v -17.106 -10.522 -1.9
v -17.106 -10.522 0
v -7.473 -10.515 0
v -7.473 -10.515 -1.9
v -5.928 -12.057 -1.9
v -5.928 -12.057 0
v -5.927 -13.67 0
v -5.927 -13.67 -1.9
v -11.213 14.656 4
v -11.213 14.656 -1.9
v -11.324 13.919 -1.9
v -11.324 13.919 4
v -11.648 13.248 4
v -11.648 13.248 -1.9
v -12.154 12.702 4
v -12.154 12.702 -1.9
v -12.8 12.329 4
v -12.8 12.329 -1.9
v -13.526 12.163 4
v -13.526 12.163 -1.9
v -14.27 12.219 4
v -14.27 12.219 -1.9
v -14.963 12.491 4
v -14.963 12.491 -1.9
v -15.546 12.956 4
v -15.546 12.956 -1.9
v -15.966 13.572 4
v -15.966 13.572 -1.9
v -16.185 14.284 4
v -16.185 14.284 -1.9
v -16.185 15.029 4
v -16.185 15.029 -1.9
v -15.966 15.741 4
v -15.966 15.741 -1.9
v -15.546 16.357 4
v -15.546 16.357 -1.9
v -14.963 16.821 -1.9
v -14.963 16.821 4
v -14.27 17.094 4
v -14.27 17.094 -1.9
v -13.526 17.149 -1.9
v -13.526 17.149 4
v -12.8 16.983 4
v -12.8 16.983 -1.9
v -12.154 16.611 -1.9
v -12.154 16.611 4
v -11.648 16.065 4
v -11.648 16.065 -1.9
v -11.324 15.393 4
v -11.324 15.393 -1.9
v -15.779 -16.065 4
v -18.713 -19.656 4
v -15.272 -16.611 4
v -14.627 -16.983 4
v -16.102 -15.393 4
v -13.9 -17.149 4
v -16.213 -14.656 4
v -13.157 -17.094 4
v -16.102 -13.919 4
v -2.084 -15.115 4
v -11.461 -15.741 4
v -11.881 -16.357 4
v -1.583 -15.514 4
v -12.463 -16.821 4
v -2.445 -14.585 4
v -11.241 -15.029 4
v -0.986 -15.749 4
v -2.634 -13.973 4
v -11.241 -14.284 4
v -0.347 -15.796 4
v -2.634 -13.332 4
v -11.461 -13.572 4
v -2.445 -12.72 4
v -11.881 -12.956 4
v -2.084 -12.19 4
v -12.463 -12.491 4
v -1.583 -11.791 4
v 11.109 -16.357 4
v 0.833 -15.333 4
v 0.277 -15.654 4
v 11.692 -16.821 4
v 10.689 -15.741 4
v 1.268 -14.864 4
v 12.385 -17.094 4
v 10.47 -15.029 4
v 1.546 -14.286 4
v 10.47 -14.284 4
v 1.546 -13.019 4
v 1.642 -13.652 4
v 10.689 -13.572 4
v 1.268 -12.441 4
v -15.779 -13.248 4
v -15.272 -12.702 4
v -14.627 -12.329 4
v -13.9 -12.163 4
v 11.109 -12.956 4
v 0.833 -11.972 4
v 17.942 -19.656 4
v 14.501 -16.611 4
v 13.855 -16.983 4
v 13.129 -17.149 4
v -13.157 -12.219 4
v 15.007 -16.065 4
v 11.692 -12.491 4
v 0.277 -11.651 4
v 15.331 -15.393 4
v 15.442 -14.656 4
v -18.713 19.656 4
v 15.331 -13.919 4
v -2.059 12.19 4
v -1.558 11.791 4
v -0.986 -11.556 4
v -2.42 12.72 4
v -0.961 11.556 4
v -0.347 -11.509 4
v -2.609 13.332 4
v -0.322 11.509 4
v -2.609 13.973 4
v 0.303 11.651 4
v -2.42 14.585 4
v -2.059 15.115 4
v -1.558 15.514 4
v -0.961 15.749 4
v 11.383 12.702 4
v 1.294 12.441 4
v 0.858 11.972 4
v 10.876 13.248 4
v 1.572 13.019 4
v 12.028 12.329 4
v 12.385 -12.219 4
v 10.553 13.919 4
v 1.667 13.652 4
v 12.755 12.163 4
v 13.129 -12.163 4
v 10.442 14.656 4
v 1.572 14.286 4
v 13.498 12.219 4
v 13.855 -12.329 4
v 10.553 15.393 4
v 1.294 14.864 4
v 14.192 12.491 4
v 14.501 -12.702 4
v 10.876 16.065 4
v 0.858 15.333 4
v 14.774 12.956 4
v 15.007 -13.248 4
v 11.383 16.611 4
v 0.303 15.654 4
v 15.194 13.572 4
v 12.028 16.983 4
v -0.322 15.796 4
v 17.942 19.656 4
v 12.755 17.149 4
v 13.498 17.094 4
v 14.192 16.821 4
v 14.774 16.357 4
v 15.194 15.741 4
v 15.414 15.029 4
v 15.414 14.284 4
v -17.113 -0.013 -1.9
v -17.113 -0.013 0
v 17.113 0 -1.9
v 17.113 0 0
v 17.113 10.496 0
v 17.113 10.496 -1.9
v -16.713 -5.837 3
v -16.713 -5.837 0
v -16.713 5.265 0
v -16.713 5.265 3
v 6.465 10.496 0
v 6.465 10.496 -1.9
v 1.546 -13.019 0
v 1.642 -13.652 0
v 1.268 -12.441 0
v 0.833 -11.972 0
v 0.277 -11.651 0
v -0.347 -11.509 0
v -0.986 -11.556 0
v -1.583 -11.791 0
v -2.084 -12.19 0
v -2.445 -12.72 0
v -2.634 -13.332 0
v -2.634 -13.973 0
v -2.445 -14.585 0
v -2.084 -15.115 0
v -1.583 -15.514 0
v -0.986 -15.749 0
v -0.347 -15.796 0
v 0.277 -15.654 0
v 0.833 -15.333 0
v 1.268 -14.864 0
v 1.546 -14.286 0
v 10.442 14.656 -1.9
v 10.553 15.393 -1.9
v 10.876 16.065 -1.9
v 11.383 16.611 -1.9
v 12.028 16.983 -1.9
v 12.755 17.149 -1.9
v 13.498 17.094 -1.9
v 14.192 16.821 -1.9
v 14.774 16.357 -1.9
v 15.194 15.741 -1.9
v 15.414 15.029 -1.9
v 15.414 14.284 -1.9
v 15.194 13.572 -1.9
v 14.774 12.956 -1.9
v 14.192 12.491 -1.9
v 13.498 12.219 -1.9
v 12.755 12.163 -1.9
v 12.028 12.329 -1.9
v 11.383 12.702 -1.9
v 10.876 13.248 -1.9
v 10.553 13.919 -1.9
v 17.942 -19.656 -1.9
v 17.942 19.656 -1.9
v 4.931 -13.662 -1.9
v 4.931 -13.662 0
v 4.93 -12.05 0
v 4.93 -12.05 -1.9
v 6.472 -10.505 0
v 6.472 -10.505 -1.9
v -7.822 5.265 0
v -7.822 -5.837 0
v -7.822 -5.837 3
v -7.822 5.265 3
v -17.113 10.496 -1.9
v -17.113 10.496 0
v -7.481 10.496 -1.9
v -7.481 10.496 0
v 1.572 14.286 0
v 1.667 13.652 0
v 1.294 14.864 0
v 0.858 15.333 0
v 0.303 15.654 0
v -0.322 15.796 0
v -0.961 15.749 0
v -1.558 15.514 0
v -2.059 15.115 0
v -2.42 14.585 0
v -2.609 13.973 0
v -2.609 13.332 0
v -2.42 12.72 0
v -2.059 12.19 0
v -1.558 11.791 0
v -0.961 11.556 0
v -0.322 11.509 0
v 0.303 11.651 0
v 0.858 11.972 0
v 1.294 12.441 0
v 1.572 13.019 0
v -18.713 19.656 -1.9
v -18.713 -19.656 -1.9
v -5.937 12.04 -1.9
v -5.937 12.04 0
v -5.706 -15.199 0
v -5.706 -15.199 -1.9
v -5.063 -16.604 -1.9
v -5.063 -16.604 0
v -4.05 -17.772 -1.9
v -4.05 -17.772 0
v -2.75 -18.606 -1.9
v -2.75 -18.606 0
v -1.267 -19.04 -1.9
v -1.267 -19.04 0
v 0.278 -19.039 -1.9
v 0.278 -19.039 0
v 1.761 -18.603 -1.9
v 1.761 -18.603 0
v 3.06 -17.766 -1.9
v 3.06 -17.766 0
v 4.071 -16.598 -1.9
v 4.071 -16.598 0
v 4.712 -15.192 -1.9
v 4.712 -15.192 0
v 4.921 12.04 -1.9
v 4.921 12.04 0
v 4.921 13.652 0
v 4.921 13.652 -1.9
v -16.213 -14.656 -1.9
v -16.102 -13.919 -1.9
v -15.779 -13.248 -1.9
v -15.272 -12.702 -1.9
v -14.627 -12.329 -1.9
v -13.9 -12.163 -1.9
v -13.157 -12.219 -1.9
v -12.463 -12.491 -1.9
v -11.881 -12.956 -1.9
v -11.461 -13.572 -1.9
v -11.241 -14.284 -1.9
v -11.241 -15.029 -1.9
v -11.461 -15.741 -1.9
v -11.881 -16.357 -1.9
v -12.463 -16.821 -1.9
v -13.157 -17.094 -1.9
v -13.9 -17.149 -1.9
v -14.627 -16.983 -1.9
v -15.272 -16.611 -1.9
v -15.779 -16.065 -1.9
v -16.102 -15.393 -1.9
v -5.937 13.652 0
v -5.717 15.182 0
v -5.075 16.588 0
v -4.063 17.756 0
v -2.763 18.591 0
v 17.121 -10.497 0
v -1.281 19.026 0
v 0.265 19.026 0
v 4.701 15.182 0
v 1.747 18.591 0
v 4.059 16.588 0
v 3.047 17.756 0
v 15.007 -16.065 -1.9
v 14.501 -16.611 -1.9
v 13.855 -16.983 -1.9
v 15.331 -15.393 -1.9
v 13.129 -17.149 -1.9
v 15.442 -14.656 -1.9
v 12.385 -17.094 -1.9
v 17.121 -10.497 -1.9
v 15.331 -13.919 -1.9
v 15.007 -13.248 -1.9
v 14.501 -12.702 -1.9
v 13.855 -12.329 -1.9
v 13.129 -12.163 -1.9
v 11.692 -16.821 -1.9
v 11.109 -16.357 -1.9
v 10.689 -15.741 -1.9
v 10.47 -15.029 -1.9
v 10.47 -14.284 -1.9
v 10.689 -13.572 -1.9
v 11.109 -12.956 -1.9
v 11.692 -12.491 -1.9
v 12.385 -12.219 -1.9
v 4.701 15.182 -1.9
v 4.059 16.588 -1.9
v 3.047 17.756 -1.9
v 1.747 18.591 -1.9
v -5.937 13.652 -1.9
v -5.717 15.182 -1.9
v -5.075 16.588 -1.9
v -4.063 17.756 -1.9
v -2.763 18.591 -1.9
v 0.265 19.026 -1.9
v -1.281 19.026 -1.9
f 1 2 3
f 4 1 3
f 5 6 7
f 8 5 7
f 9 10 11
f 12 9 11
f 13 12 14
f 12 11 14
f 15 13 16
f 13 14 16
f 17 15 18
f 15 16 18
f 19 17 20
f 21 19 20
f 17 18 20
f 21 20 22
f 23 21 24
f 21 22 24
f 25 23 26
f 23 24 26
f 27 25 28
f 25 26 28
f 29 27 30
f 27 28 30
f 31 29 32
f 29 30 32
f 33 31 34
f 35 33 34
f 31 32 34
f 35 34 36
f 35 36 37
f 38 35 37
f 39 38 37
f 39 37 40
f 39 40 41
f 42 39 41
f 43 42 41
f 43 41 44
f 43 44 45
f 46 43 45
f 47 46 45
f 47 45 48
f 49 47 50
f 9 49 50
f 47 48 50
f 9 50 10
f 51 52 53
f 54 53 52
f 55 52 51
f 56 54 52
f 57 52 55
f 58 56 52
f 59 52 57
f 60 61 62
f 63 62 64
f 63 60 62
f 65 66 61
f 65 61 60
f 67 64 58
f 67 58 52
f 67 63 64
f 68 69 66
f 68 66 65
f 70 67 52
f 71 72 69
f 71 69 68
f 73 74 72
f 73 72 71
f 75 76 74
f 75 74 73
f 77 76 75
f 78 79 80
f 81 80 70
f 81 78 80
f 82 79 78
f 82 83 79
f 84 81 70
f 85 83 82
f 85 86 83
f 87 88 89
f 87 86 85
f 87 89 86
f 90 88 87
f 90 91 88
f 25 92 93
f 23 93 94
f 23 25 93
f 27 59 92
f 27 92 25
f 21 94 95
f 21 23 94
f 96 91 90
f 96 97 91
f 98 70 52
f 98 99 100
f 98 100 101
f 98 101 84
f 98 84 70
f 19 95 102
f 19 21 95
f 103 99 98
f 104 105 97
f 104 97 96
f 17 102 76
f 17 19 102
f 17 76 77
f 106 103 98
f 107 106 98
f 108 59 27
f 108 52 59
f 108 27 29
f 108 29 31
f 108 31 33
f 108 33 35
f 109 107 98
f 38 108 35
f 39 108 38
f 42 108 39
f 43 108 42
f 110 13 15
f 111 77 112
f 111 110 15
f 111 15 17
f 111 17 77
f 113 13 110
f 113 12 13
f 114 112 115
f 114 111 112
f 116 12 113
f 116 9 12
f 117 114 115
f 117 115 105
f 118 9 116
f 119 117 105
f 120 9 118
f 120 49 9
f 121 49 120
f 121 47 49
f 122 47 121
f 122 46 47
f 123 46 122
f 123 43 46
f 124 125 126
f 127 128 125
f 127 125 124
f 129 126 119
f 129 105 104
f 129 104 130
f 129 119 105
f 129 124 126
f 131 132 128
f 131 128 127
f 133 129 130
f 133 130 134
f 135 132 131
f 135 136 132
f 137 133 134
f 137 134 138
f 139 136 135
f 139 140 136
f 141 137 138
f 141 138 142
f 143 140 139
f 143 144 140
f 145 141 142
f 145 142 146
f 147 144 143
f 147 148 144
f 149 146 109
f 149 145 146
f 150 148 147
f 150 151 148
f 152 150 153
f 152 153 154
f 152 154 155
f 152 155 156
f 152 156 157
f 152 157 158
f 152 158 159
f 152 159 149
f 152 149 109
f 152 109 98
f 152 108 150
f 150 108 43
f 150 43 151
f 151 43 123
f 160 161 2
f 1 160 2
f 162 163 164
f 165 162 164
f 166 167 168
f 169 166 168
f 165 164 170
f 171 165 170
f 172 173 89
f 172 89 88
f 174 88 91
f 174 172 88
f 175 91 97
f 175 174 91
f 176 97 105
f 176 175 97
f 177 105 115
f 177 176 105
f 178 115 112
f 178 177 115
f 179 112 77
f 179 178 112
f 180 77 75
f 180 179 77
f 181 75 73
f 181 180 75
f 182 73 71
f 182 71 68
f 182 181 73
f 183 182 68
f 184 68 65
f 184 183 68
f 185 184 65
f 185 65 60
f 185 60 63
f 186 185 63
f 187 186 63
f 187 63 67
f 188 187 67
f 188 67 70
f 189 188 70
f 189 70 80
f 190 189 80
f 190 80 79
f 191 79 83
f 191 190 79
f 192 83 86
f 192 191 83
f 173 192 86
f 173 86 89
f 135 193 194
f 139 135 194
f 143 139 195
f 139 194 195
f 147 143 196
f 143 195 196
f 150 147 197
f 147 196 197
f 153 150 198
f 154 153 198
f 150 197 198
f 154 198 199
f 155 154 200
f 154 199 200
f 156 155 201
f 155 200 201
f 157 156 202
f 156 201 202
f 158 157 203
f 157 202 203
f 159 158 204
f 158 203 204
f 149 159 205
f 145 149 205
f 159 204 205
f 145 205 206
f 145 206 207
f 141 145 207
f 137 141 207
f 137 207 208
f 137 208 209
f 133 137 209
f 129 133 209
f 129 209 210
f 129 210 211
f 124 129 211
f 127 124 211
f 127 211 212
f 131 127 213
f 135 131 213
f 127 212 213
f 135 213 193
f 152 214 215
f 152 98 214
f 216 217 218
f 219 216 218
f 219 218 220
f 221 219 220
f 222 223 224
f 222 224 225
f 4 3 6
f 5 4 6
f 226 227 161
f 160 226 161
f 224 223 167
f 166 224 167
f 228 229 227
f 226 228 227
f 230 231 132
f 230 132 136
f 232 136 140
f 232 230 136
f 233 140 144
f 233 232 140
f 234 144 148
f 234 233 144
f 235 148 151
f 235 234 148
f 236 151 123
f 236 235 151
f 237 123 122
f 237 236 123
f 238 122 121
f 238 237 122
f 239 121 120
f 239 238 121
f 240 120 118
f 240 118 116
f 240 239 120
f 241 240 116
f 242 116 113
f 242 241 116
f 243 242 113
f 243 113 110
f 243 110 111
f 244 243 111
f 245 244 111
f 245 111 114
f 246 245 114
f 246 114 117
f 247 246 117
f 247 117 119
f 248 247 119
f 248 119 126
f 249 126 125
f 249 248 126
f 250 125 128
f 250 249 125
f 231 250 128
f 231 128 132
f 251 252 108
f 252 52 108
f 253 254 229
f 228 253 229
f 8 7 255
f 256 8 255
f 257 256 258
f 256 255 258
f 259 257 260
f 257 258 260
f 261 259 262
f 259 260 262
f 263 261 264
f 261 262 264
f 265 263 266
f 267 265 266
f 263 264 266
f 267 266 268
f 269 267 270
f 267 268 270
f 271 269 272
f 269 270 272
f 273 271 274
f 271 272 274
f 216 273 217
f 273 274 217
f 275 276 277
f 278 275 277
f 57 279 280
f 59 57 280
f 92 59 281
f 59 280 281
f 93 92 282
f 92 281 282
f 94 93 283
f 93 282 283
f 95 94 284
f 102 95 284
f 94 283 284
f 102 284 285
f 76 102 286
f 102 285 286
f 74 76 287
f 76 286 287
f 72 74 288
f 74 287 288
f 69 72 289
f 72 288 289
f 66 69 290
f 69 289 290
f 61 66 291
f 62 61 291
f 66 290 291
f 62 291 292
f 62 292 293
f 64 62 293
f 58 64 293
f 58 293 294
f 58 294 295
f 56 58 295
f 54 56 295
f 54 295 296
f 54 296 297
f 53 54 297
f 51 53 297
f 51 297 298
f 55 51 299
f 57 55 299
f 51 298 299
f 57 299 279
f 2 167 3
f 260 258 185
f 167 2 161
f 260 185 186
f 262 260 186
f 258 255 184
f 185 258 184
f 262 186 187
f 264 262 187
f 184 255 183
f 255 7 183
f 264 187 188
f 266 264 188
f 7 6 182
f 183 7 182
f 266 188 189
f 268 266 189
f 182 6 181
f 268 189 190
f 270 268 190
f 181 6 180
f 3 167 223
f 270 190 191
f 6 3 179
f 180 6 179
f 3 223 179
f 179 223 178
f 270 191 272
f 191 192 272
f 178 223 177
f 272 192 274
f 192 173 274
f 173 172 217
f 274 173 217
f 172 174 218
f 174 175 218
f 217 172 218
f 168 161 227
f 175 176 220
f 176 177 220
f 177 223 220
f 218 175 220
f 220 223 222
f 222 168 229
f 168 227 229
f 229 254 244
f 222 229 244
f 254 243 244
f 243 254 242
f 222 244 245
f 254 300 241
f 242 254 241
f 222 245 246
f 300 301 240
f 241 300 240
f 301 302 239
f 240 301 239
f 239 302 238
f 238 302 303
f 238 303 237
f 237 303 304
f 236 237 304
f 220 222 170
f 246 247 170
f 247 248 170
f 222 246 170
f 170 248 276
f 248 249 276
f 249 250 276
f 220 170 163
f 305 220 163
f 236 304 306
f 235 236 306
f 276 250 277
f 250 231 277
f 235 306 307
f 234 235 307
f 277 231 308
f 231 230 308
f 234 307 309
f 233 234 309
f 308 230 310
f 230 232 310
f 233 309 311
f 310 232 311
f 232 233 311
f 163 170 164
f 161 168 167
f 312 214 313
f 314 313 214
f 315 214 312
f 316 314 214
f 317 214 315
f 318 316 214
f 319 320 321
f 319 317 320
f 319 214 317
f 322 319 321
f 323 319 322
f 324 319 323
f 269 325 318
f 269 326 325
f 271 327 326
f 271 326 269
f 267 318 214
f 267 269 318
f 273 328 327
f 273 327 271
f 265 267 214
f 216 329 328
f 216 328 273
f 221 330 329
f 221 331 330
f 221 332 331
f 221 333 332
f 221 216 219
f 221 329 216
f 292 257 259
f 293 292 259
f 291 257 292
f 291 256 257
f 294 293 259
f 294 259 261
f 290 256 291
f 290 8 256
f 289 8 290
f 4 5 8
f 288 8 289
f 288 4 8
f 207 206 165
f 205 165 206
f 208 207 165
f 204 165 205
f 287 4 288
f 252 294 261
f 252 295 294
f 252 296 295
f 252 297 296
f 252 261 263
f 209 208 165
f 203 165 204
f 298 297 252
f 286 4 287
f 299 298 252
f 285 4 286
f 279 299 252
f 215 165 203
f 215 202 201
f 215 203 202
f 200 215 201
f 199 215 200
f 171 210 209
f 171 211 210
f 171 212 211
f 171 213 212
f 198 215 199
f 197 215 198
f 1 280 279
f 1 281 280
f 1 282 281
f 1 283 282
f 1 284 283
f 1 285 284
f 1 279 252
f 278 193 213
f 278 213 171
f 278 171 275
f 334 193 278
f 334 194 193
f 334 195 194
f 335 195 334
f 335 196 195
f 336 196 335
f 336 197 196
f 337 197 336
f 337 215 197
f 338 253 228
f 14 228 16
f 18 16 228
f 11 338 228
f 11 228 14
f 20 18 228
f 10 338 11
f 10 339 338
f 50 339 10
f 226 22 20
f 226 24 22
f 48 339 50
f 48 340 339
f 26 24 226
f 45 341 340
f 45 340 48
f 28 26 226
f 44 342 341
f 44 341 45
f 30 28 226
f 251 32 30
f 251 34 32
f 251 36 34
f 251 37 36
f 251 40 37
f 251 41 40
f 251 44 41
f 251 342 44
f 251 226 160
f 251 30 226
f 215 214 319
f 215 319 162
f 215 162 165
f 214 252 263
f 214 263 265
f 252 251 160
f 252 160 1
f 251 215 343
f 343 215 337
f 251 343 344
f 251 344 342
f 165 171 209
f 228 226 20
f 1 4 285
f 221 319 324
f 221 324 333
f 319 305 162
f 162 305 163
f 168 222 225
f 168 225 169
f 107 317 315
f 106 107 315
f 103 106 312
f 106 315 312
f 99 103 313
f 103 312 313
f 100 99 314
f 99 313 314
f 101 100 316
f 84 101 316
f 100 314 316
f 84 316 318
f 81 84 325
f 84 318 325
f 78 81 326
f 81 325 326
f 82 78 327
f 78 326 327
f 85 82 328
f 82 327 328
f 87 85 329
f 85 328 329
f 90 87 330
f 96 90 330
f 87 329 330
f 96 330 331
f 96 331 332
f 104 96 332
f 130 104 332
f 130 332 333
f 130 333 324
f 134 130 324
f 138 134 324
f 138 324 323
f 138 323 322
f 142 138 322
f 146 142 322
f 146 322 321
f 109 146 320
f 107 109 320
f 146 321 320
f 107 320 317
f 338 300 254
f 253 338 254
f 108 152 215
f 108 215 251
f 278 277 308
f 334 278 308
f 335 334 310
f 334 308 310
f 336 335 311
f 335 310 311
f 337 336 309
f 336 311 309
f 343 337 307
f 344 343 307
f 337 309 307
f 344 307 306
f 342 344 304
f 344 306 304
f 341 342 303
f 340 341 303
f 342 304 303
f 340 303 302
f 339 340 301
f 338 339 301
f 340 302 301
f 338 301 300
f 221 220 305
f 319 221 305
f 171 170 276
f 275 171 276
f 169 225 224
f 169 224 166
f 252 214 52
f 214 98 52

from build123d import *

# Parameters (mm, degrees)
SKETCH1_W           = 36.654989836
SKETCH1_H           = 39.3126
SKETCH1_R           = 2.15
BOSS_EXTRUDE1_DEPTH = 4
SKETCH2_W           = 36.654989836
SKETCH2_H           = 39.3126
BOSS_EXTRUDE2_DEPTH = 1.900000015
SKETCH3_R           = 2.5
CUT_EXTRUDE1_DEPTH  = 5.900000015
SKETCH4_W           = 8.8912
SKETCH4_H           = 11.10254
CUT_EXTRUDE2_DEPTH  = 3


with BuildPart() as part:
    # Sketch1 → Boss-Extrude1 (new body)
    with BuildSketch(Plane.XY):
        with Locations((-0.385705082, 0)):
            Rectangle(SKETCH1_W, SKETCH1_H)
        with Locations((-0.4826, 13.6525)):
            Circle(SKETCH1_R, mode=Mode.SUBTRACT)
        with Locations((-0.508, -13.6525)):
            Circle(SKETCH1_R, mode=Mode.SUBTRACT)
    extrude(amount=BOSS_EXTRUDE1_DEPTH)

    # Sketch2 → Boss-Extrude2 (add)
    with BuildSketch(Plane(origin=(0, 0, 0), x_dir=(-1, 0, 0), z_dir=(0, 0, -1))):
        with Locations((0.385705082, 0)):
            Rectangle(SKETCH2_W, SKETCH2_H)
        with BuildLine():
            Line((-17.1132, 10.4965), (-6.464885425, 10.4965))
            Line((-6.464885425, 10.4965), (-4.9212, 12.040185425))
            Line((-4.9212, 12.040185425), (-4.9212, 13.6525))
            ThreePointArc((-4.9212, 13.6525), (0.508, 19.0817), (5.9372, 13.6525))
            Line((5.9372, 13.6525), (5.9372, 12.040185425))
            Line((5.9372, 12.040185425), (7.480885425, 10.4965))
            Line((7.480885425, 10.4965), (17.1132, 10.4965))
            Line((17.1132, 10.4965), (17.1132, -0.0127))
            Line((17.1132, -0.0127), (17.105585288, -10.521897241))
            Line((17.105585288, -10.521897241), (7.473273242, -10.514917899))
            Line((7.473273242, -10.514917899), (5.928469705, -12.057484402))
            Line((5.928469705, -12.057484402), (5.927301461, -13.669798554))
            ThreePointArc((5.927301461, -13.669798554), (0.494169019, -19.095063262), (-4.931095689, -13.66193082))
            Line((-4.931095689, -13.66193082), (-4.929927445, -12.049616668))
            Line((-4.929927445, -12.049616668), (-6.472493947, -10.504813132))
            Line((-6.472493947, -10.504813132), (-17.120805727, -10.497097621))
            Line((-17.120805727, -10.497097621), (-17.1132, -0.000300188))
            Line((-17.1132, -0.000300188), (-17.1132, 10.4965))
        make_face(mode=Mode.SUBTRACT)
    extrude(amount=BOSS_EXTRUDE2_DEPTH)

    # Sketch3 → Cut-Extrude1 (cut)
    with BuildSketch(Plane(origin=(0, 0, -1.900000015), x_dir=(-1, 0, 0), z_dir=(0, 0, -1))):
        with Locations((-12.941789836, 14.6563)):
            Circle(SKETCH3_R)
        with Locations(Location((13.7132, 14.6563, 0), (0, 0, 180))):
            Circle(SKETCH3_R)
        with Locations((13.7132, -14.6563)):
            Circle(SKETCH3_R)
        with Locations(Location((-12.941789836, -14.6563, 0), (0, 0, 180))):
            Circle(SKETCH3_R)
    extrude(amount=-CUT_EXTRUDE1_DEPTH, mode=Mode.SUBTRACT)

    # Sketch4 → Cut-Extrude2 (cut)
    with BuildSketch(Plane(origin=(0, 0, 0), x_dir=(-1, 0, 0), z_dir=(0, 0, -1))):
        with Locations((12.2676, -0.28623)):
            Rectangle(SKETCH4_W, SKETCH4_H)
    extrude(amount=-CUT_EXTRUDE2_DEPTH, mode=Mode.SUBTRACT)


solid = part.part
